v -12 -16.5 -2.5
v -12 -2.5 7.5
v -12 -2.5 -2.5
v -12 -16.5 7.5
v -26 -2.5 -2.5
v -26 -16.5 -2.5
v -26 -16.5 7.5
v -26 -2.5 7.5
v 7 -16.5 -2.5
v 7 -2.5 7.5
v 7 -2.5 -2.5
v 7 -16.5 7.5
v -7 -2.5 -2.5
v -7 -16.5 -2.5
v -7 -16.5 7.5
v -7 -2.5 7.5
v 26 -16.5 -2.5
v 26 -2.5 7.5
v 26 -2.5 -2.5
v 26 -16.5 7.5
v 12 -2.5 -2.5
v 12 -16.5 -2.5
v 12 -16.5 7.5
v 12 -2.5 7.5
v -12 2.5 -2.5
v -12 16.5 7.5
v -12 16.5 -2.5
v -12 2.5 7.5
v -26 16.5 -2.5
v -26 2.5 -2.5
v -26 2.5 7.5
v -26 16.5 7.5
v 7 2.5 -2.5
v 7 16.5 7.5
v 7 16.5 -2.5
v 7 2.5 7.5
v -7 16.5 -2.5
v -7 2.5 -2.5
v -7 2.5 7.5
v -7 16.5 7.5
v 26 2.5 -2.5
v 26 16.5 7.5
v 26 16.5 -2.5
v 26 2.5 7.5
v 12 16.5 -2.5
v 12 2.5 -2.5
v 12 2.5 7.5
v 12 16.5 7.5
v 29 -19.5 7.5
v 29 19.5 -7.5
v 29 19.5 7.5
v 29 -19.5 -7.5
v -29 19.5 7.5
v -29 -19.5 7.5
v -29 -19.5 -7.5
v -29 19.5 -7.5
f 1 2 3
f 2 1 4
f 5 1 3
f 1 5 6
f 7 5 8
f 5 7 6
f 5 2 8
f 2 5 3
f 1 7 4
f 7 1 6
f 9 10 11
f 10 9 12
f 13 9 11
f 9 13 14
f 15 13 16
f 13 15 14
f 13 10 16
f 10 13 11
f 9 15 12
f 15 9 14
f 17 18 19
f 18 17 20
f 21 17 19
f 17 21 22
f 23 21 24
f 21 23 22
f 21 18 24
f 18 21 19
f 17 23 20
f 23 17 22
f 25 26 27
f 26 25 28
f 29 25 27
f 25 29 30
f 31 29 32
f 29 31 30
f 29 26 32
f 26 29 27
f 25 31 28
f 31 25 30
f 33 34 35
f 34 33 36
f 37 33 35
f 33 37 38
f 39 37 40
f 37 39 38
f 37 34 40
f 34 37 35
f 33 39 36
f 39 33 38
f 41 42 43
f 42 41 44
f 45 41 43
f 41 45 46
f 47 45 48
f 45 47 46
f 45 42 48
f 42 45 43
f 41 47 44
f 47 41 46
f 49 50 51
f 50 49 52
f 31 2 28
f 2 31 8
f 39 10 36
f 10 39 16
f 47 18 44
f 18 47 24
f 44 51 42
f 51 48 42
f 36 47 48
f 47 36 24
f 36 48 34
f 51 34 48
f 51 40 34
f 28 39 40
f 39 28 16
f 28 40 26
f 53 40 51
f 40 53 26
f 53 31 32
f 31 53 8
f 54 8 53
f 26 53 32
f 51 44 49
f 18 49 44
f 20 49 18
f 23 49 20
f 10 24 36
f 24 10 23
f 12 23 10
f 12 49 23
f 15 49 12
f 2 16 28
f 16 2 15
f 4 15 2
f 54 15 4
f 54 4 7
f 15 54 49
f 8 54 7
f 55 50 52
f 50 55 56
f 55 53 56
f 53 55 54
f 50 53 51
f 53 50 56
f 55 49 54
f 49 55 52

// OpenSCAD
$fn = 32;

// ----------------------------------------------------------------------
// Pocket plate 58 x 39 x 15
// 2 x 3 pockets 14 mm square, 10 mm deep
// ----------------------------------------------------------------------

// --- parameters (mm) ---
thickness = 15;  // plate thickness
floor_t = 5;     // material left under each pocket
pocket = 14;     // pocket side length
pitch_x = 19;    // pocket pitch along X
pitch_y = 19;    // pocket pitch along Y
cols = 3;        // pockets per row
rows = 2;        // rows of pockets

// --- derived feature positions (mm) ---
depth = thickness - floor_t;        // = 10   pocket depth, down to the floor
span_x = (cols - 1) * pitch_x;      // = 38   distance between outer pockets
span_y = (rows - 1) * pitch_y;      // = 19   distance between outer pocket rows
origin_x = -span_x / 2;             // = -19   X of the first pocket
origin_y = -span_y / 2;             // = -9.5   Y of the first pocket
plate = [span_x + pocket + 6, span_y + pocket + 6, thickness];  // = [58, 39, 15]   overall size: pockets plus 3 mm of wall on each side
feature_centers = [
  [origin_x + 0 * pitch_x, origin_y + 0 * pitch_y],
  [origin_x + 1 * pitch_x, origin_y + 0 * pitch_y],
  [origin_x + 2 * pitch_x, origin_y + 0 * pitch_y],
  [origin_x + 0 * pitch_x, origin_y + 1 * pitch_y],
  [origin_x + 1 * pitch_x, origin_y + 1 * pitch_y],
  [origin_x + 2 * pitch_x, origin_y + 1 * pitch_y]
];   // pocket centres, used verbatim by the cutter loop

// plate outline, then one pocket per centre in feature_centers
difference() {
  cube(plate, center = true);
  for (centre = feature_centers)
    translate([centre[0] - pocket / 2, centre[1] - pocket / 2, plate[2] / 2 - depth])
      cube([pocket, pocket, depth + 1]);  // centred on the declared pocket centre
}
